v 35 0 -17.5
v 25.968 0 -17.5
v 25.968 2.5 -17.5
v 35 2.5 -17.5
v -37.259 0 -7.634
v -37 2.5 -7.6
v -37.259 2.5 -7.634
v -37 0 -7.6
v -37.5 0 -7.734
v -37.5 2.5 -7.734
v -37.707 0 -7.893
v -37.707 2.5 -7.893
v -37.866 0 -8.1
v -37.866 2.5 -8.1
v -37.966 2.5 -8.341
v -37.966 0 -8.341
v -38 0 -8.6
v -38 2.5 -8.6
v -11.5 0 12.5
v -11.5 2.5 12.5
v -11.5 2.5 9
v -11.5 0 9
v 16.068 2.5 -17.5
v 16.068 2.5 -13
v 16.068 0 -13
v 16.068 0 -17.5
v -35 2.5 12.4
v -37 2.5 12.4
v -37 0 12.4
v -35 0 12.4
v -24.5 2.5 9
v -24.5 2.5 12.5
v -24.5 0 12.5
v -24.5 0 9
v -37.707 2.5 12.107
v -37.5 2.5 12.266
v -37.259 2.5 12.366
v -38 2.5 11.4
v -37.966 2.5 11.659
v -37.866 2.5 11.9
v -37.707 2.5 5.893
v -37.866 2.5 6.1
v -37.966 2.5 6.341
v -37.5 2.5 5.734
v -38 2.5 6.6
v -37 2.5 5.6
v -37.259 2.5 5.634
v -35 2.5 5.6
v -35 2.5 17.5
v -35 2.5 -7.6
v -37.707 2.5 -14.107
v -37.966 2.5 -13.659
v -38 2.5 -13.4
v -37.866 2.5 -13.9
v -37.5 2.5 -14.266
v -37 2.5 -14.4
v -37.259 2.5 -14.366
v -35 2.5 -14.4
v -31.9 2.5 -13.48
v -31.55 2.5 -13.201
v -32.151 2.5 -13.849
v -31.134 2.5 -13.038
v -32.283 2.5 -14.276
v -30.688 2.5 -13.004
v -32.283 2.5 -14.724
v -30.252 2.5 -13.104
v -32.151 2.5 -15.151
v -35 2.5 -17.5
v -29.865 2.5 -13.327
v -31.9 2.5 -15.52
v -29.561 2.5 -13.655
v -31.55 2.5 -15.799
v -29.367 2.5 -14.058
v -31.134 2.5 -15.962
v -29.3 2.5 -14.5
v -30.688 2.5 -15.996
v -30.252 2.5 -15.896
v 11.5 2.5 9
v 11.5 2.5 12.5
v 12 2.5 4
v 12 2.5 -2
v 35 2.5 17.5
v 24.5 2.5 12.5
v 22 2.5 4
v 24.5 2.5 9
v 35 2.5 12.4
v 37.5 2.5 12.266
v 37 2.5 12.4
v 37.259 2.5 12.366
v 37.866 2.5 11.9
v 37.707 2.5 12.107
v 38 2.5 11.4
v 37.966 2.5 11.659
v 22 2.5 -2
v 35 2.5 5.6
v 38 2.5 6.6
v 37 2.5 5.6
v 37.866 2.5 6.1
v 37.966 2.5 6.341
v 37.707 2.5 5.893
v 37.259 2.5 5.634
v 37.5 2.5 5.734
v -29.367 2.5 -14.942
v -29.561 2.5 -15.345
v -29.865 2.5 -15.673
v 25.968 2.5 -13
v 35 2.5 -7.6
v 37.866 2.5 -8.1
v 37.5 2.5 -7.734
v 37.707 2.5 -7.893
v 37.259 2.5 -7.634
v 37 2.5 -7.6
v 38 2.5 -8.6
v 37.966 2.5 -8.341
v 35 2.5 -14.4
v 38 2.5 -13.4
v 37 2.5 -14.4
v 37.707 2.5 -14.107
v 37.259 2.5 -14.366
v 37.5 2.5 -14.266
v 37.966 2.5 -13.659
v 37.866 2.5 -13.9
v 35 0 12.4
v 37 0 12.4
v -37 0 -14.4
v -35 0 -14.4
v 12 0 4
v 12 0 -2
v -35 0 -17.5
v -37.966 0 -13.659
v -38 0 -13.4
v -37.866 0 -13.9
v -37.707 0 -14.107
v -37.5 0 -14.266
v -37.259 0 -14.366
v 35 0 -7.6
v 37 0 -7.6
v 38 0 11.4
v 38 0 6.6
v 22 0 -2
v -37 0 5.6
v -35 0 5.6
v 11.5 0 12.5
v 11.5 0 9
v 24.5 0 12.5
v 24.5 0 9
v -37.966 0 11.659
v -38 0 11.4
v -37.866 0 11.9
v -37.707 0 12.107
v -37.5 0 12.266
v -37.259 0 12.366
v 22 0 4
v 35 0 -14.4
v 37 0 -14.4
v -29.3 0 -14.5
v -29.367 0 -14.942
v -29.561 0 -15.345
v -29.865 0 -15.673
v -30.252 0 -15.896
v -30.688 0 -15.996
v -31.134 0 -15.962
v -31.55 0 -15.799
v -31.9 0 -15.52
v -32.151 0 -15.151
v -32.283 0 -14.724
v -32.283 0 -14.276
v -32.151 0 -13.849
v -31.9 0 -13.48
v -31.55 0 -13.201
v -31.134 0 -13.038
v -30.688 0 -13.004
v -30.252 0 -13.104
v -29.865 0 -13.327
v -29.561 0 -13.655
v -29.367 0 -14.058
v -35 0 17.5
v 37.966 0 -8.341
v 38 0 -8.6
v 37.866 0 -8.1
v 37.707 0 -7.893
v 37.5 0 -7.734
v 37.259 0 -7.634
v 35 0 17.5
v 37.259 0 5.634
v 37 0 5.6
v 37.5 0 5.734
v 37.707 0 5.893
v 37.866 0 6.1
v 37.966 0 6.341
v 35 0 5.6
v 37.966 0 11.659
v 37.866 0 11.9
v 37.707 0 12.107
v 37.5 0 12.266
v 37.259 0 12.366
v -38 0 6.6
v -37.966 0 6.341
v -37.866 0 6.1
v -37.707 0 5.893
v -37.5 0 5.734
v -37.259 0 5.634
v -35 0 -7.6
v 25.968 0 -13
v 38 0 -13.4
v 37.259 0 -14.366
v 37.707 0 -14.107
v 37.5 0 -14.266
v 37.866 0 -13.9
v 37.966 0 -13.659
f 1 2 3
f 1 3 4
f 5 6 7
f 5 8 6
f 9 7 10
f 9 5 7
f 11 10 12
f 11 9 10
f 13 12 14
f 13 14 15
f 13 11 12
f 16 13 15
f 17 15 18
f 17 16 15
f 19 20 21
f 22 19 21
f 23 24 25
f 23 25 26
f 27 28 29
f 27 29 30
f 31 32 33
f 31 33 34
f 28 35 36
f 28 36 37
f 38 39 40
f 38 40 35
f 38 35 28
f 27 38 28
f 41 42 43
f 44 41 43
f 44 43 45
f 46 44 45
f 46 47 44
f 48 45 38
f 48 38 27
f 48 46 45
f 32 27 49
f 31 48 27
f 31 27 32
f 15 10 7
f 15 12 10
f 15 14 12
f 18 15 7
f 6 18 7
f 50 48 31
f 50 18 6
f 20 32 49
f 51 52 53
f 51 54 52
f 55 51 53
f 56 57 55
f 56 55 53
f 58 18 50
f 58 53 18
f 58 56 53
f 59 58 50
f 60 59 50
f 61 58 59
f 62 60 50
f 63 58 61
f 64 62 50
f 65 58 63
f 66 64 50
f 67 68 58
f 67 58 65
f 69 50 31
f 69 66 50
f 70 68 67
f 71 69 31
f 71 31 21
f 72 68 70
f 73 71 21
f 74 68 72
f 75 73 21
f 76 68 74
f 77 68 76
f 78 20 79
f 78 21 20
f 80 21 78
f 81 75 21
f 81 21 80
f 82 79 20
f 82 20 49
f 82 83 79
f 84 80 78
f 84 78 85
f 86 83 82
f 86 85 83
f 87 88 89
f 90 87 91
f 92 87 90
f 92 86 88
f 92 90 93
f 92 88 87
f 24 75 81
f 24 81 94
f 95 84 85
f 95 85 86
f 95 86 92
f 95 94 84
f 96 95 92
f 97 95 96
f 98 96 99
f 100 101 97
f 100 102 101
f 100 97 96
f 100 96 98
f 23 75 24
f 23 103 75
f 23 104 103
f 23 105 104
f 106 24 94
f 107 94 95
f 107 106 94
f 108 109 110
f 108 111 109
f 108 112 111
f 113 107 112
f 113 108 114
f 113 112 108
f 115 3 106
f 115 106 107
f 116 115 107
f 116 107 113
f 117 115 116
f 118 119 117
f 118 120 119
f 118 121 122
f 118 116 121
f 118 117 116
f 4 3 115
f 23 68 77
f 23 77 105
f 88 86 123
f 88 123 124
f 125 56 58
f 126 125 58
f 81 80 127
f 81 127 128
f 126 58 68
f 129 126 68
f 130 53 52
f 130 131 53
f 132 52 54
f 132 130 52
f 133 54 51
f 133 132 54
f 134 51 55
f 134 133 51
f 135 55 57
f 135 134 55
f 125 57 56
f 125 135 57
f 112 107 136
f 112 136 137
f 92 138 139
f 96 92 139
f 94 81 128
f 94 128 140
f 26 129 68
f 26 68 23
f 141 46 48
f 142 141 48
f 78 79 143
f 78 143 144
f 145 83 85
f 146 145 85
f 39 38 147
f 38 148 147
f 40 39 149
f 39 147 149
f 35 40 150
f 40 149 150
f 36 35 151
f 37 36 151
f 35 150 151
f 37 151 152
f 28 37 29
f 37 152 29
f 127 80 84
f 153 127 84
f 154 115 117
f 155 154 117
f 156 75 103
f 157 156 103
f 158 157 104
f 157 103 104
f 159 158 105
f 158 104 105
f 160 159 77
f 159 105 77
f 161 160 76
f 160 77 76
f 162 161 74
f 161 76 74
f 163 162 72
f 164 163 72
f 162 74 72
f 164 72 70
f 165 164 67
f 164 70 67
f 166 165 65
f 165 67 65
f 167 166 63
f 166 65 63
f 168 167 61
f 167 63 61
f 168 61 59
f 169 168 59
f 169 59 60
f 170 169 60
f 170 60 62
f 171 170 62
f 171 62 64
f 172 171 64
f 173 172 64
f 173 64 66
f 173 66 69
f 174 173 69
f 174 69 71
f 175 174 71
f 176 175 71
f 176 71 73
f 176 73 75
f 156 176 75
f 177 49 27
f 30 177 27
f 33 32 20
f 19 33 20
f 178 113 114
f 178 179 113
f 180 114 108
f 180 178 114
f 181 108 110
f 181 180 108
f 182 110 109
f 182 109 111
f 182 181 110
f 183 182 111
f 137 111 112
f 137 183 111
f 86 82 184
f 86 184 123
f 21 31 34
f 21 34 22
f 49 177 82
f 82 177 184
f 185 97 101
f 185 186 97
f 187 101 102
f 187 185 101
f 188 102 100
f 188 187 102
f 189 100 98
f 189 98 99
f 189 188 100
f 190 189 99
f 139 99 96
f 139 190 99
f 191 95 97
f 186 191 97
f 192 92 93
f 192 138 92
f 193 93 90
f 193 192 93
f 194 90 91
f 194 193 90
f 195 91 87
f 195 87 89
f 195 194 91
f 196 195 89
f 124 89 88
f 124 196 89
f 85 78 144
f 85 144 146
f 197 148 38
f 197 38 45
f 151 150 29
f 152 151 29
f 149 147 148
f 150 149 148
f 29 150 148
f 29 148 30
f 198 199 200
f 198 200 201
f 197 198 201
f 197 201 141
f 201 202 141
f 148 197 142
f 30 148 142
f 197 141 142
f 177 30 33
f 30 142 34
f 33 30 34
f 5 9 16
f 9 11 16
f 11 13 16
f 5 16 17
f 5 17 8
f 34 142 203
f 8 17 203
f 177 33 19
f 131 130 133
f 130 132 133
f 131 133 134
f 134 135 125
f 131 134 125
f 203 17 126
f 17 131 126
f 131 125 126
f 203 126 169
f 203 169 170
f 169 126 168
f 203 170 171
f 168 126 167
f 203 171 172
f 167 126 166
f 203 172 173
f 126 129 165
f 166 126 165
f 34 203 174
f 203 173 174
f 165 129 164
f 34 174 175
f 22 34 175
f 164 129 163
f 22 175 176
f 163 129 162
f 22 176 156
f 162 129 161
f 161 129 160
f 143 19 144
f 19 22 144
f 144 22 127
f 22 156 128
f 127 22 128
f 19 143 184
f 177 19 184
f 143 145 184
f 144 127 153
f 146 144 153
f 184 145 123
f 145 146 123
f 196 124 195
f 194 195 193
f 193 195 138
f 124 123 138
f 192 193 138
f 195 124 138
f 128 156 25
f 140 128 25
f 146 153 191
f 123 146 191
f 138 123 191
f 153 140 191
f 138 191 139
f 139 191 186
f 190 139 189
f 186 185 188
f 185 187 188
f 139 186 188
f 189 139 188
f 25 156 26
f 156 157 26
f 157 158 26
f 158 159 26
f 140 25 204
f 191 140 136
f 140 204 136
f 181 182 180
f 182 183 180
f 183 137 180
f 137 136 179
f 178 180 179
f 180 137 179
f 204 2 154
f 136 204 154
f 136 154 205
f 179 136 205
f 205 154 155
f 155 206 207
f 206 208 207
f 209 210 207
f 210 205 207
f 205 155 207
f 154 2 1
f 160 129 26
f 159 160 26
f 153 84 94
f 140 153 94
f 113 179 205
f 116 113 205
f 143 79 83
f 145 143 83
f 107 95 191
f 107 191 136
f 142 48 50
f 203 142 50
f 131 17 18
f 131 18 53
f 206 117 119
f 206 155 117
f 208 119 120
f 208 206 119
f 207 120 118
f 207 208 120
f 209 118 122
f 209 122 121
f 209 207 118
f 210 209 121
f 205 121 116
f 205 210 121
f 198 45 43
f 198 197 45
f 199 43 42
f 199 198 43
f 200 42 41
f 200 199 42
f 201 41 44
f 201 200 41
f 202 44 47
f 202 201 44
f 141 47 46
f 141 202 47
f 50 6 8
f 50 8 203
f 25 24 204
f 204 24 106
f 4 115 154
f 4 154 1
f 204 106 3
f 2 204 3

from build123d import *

# Parameters (mm, degrees)
SKETCH_1_W          = 76
SKETCH_1_H          = 35
EXTRUDE_1_DEPTH     = 2.5
SKETCH_2_W          = 13
SKETCH_2_H          = 3.5
CUT_EXTRUDE_1_DEPTH = 3.5
SKETCH_3_W          = 3
SKETCH_3_H          = 5.1
SKETCH_3_H_2        = 3.1
SKETCH_3_H_3        = 13.2
CUT_EXTRUDE_2_DEPTH = 3.5
FILLET_1_R          = 1
SKETCH_4_R          = 1.5
SKETCH_4_W          = 9.9
SKETCH_4_H          = 4.5
CUT_EXTRUDE_3_DEPTH = 3.5
SKETCH_5_W          = 10
SKETCH_5_H          = 6
CUT_EXTRUDE_4_DEPTH = 3.5


with BuildPart() as part:
    # 草图1 → 凸台-拉伸1 (new body)
    with BuildSketch(Plane(origin=(0, 0, 0), x_dir=(1, 0, 0), z_dir=(0, 1, 0))):
        Rectangle(SKETCH_1_W, SKETCH_1_H)
    extrude(amount=EXTRUDE_1_DEPTH)

    # 草图2 → 切除-拉伸1 (cut, through all)
    with BuildSketch(Plane(origin=(0, 2.5, 0), x_dir=(1, 0, 0), z_dir=(0, 1, 0))):
        with Locations((-18, -10.75)):
            Rectangle(SKETCH_2_W, SKETCH_2_H)
        with Locations((18, -10.75)):
            Rectangle(SKETCH_2_W, SKETCH_2_H)
    extrude(amount=-CUT_EXTRUDE_1_DEPTH, mode=Mode.SUBTRACT)

    # 草图3 → 切除-拉伸2 (cut, through all)
    with BuildSketch(Plane(origin=(0, 2.5, 0), x_dir=(1, 0, 0), z_dir=(0, 1, 0))):
        with Locations((-36.5, -14.95)):
            Rectangle(SKETCH_3_W, SKETCH_3_H)
        with Locations((-36.5, 15.95)):
            Rectangle(SKETCH_3_W, SKETCH_3_H_2)
        with Locations((-36.5, 1)):
            Rectangle(SKETCH_3_W, SKETCH_3_H_3)
        with Locations((36.5, -14.95)):
            Rectangle(SKETCH_3_W, SKETCH_3_H)
        with Locations((36.5, 1)):
            Rectangle(SKETCH_3_W, SKETCH_3_H_3)
        with Locations((36.5, 15.95)):
            Rectangle(SKETCH_3_W, SKETCH_3_H_2)
    extrude(amount=-CUT_EXTRUDE_2_DEPTH, mode=Mode.SUBTRACT)

    # 圆角1
    fillet_1_edges = [part.edges().sort_by_distance(p)[0] for p in [
        (38, 1.25, -7.6),
        (38, 1.25, 5.6),
        (38, 1.25, -14.4),
        (-38, 1.25, 12.4),
        (-38, 1.25, -14.4),
        (-38, 1.25, 5.6),
        (-38, 1.25, -7.6),
        (38, 1.25, 12.4),
    ]]
    fillet(fillet_1_edges, radius=FILLET_1_R)

    # 草图4 → 切除-拉伸3 (cut, through all)
    with BuildSketch(Plane(origin=(0, 2.5, 0), x_dir=(1, 0, 0), z_dir=(0, 1, 0))):
        with Locations((-30.8, 14.5)):
            Circle(SKETCH_4_R)
        with Locations((21.018135054, 15.25)):
            Rectangle(SKETCH_4_W, SKETCH_4_H)
    extrude(amount=-CUT_EXTRUDE_3_DEPTH, mode=Mode.SUBTRACT)

    # 草图5 → 切除-拉伸4 (cut, through all)
    with BuildSketch(Plane(origin=(0, 2.5, 0), x_dir=(1, 0, 0), z_dir=(0, 1, 0))):
        with Locations((17, -1)):
            Rectangle(SKETCH_5_W, SKETCH_5_H)
    extrude(amount=-CUT_EXTRUDE_4_DEPTH, mode=Mode.SUBTRACT)


solid = part.part
